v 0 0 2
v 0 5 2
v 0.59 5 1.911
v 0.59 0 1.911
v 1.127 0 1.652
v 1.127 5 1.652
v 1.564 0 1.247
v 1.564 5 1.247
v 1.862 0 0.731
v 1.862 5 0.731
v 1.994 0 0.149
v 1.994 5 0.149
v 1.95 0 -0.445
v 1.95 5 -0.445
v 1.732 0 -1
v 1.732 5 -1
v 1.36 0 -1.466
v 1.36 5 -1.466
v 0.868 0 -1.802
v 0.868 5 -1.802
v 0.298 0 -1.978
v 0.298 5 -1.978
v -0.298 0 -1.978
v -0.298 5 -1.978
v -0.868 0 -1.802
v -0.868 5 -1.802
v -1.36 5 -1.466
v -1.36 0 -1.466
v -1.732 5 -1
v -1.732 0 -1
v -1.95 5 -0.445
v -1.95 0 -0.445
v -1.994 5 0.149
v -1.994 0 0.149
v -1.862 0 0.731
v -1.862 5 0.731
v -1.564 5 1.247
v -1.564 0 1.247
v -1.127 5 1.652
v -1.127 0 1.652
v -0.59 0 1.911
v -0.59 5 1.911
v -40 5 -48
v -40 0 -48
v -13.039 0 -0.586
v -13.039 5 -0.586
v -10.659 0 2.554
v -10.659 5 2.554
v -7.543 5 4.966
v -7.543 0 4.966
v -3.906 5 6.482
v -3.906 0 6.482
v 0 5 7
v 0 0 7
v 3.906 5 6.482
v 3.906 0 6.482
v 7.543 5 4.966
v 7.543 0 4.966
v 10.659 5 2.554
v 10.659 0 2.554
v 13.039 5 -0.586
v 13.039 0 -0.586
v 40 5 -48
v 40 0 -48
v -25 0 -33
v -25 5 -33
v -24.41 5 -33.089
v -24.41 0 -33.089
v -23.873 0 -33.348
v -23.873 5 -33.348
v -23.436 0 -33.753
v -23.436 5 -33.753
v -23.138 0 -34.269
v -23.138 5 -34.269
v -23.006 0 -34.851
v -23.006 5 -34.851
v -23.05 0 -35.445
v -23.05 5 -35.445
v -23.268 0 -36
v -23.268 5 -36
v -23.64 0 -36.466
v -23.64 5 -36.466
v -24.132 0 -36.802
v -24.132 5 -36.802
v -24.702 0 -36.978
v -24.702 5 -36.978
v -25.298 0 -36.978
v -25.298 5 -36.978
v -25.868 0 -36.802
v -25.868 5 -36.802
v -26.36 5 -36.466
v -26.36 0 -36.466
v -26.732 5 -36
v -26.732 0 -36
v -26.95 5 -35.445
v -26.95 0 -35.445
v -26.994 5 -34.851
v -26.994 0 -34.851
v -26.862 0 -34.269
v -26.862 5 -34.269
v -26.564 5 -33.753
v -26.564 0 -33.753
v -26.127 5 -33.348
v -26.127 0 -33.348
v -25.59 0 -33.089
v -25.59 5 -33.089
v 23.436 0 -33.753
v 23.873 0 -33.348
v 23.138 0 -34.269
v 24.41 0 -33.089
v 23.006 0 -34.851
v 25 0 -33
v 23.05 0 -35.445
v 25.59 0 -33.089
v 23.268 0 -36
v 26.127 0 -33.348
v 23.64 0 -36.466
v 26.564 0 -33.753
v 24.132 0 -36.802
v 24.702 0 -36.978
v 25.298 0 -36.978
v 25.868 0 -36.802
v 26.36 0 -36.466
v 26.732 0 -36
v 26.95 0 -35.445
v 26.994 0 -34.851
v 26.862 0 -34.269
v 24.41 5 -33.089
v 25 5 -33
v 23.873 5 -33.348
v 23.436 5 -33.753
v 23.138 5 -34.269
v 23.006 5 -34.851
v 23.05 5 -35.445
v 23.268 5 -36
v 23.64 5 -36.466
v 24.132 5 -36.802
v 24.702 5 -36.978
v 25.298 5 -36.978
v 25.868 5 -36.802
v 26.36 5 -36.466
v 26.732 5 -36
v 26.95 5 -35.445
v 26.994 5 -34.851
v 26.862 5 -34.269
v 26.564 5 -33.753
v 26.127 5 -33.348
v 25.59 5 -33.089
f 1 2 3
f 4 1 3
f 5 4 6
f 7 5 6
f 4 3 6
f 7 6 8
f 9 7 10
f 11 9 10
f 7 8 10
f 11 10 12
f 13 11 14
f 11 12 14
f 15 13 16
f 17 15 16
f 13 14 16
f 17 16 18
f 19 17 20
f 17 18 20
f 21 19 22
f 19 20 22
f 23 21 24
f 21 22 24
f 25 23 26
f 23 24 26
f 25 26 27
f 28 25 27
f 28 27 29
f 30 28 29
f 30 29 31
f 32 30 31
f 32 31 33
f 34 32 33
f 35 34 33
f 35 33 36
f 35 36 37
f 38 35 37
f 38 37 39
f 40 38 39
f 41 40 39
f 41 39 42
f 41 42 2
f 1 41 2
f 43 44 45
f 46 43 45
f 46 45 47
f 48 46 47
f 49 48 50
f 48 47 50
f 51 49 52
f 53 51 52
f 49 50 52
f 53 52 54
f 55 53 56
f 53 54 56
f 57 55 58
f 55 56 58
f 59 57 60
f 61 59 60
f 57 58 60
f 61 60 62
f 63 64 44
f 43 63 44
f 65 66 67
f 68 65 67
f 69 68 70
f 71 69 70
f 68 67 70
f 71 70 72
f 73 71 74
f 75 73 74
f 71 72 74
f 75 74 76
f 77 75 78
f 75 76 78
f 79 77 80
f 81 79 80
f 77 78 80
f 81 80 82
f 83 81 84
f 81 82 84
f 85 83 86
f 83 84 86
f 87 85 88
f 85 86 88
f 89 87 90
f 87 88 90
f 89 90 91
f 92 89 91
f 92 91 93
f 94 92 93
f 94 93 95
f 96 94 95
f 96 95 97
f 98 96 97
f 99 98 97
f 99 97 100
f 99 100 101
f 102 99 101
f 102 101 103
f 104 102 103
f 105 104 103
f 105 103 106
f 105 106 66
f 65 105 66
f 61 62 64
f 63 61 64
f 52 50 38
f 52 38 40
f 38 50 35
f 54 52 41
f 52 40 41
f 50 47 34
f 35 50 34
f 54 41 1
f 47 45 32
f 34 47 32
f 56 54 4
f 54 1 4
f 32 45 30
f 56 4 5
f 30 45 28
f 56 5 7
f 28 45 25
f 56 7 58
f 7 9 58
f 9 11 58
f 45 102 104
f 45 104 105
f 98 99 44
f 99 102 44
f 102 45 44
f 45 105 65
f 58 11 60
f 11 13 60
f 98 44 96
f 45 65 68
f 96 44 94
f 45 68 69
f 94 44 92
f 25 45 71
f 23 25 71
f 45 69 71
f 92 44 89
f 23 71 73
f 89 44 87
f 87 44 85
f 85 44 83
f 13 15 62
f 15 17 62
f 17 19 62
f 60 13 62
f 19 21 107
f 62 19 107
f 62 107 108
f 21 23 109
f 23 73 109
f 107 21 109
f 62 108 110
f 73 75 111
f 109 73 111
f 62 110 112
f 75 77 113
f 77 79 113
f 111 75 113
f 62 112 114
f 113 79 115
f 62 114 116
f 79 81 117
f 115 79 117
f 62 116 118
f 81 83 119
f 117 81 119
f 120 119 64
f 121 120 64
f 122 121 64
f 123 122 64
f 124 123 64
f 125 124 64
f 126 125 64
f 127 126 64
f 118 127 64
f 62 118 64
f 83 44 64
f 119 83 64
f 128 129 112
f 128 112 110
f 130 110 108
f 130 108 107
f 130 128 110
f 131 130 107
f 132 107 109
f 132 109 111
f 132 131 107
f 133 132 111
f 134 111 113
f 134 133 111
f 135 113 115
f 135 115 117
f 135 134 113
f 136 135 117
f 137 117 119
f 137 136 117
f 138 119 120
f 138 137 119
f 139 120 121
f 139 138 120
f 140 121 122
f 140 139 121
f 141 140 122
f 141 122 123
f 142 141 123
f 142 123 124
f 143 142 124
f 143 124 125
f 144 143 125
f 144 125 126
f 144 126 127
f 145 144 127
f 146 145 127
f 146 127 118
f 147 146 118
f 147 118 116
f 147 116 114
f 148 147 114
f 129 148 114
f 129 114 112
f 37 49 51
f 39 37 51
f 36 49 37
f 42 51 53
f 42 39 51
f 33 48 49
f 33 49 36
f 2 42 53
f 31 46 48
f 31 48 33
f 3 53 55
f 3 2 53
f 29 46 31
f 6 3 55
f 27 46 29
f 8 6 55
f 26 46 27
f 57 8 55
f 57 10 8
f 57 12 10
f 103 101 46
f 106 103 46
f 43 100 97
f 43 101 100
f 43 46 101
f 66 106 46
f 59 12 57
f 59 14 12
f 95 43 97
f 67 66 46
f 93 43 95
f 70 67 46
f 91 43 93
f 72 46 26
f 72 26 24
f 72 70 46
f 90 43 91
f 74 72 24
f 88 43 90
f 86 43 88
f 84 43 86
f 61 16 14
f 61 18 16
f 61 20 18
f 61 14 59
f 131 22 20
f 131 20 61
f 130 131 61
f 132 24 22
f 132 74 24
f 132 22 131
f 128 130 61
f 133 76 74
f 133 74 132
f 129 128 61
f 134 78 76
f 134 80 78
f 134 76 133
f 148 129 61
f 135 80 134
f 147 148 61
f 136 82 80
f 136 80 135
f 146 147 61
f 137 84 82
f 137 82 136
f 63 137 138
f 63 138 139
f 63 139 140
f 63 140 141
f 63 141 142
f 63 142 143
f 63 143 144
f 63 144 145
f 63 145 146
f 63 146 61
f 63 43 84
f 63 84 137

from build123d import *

# Parameters (mm, degrees)
BOSS_EXTRUDE1_DEPTH = 5
CUT_EXTRUDE1_REACH  = 64.682
SKETCH2_R           = 2
CUT_EXTRUDE2_REACH  = 64.682
SKETCH3_R           = 2


with BuildPart() as part:
    # Sketch1 → Boss-Extrude1 (new body)
    with BuildSketch(Plane(origin=(0, 0, 0), x_dir=(1, 0, 0), z_dir=(0, 1, 0))):
        with BuildLine():
            Line((40, 48), (-40, 48))
            Line((-40, 48), (-13.039417607, 0.585582393))
            ThreePointArc((-13.039417607, 0.585582393), (0, -7), (13.039417607, 0.585582393))
            Line((13.039417607, 0.585582393), (40, 48))
        make_face()
    extrude(amount=BOSS_EXTRUDE1_DEPTH)

    # Sketch2 → Cut-Extrude1 (cut, up to next)
    with BuildSketch(Plane(origin=(0, 5, 0), x_dir=(1, 0, 0), z_dir=(0, 1, 0)), mode=Mode.PRIVATE) as cut_extrude1_sk1:
        with Locations(Location((-25, 35, 0), (0, 0, 270))):
            Circle(SKETCH2_R)
    cut_extrude1_tool1 = extrude(cut_extrude1_sk1.sketch, amount=-CUT_EXTRUDE1_REACH, mode=Mode.PRIVATE) & part.part
    cut_extrude1 = cut_extrude1_tool1.solids().sort_by_distance((-25, 5, -35))[0]
    add(cut_extrude1, mode=Mode.SUBTRACT)

    # Mirror1: Cut-Extrude1 across plane
    add(cut_extrude1.mirror(Plane(origin=(0, 0, 0), x_dir=(0, 0, 1), z_dir=(1, 0, 0))), mode=Mode.SUBTRACT)

    # Sketch3 → Cut-Extrude2 (cut, up to next)
    with BuildSketch(Plane(origin=(0, 5, 0), x_dir=(1, 0, 0), z_dir=(0, 1, 0)), mode=Mode.PRIVATE) as cut_extrude2_sk1:
        with Locations(Location((0, 0, 0), (0, 0, 270))):
            Circle(SKETCH3_R)
    cut_extrude2_tool1 = extrude(cut_extrude2_sk1.sketch, amount=-CUT_EXTRUDE2_REACH, mode=Mode.PRIVATE) & part.part
    add(cut_extrude2_tool1.solids().sort_by_distance((0, 5, 0))[0], mode=Mode.SUBTRACT)


solid = part.part
